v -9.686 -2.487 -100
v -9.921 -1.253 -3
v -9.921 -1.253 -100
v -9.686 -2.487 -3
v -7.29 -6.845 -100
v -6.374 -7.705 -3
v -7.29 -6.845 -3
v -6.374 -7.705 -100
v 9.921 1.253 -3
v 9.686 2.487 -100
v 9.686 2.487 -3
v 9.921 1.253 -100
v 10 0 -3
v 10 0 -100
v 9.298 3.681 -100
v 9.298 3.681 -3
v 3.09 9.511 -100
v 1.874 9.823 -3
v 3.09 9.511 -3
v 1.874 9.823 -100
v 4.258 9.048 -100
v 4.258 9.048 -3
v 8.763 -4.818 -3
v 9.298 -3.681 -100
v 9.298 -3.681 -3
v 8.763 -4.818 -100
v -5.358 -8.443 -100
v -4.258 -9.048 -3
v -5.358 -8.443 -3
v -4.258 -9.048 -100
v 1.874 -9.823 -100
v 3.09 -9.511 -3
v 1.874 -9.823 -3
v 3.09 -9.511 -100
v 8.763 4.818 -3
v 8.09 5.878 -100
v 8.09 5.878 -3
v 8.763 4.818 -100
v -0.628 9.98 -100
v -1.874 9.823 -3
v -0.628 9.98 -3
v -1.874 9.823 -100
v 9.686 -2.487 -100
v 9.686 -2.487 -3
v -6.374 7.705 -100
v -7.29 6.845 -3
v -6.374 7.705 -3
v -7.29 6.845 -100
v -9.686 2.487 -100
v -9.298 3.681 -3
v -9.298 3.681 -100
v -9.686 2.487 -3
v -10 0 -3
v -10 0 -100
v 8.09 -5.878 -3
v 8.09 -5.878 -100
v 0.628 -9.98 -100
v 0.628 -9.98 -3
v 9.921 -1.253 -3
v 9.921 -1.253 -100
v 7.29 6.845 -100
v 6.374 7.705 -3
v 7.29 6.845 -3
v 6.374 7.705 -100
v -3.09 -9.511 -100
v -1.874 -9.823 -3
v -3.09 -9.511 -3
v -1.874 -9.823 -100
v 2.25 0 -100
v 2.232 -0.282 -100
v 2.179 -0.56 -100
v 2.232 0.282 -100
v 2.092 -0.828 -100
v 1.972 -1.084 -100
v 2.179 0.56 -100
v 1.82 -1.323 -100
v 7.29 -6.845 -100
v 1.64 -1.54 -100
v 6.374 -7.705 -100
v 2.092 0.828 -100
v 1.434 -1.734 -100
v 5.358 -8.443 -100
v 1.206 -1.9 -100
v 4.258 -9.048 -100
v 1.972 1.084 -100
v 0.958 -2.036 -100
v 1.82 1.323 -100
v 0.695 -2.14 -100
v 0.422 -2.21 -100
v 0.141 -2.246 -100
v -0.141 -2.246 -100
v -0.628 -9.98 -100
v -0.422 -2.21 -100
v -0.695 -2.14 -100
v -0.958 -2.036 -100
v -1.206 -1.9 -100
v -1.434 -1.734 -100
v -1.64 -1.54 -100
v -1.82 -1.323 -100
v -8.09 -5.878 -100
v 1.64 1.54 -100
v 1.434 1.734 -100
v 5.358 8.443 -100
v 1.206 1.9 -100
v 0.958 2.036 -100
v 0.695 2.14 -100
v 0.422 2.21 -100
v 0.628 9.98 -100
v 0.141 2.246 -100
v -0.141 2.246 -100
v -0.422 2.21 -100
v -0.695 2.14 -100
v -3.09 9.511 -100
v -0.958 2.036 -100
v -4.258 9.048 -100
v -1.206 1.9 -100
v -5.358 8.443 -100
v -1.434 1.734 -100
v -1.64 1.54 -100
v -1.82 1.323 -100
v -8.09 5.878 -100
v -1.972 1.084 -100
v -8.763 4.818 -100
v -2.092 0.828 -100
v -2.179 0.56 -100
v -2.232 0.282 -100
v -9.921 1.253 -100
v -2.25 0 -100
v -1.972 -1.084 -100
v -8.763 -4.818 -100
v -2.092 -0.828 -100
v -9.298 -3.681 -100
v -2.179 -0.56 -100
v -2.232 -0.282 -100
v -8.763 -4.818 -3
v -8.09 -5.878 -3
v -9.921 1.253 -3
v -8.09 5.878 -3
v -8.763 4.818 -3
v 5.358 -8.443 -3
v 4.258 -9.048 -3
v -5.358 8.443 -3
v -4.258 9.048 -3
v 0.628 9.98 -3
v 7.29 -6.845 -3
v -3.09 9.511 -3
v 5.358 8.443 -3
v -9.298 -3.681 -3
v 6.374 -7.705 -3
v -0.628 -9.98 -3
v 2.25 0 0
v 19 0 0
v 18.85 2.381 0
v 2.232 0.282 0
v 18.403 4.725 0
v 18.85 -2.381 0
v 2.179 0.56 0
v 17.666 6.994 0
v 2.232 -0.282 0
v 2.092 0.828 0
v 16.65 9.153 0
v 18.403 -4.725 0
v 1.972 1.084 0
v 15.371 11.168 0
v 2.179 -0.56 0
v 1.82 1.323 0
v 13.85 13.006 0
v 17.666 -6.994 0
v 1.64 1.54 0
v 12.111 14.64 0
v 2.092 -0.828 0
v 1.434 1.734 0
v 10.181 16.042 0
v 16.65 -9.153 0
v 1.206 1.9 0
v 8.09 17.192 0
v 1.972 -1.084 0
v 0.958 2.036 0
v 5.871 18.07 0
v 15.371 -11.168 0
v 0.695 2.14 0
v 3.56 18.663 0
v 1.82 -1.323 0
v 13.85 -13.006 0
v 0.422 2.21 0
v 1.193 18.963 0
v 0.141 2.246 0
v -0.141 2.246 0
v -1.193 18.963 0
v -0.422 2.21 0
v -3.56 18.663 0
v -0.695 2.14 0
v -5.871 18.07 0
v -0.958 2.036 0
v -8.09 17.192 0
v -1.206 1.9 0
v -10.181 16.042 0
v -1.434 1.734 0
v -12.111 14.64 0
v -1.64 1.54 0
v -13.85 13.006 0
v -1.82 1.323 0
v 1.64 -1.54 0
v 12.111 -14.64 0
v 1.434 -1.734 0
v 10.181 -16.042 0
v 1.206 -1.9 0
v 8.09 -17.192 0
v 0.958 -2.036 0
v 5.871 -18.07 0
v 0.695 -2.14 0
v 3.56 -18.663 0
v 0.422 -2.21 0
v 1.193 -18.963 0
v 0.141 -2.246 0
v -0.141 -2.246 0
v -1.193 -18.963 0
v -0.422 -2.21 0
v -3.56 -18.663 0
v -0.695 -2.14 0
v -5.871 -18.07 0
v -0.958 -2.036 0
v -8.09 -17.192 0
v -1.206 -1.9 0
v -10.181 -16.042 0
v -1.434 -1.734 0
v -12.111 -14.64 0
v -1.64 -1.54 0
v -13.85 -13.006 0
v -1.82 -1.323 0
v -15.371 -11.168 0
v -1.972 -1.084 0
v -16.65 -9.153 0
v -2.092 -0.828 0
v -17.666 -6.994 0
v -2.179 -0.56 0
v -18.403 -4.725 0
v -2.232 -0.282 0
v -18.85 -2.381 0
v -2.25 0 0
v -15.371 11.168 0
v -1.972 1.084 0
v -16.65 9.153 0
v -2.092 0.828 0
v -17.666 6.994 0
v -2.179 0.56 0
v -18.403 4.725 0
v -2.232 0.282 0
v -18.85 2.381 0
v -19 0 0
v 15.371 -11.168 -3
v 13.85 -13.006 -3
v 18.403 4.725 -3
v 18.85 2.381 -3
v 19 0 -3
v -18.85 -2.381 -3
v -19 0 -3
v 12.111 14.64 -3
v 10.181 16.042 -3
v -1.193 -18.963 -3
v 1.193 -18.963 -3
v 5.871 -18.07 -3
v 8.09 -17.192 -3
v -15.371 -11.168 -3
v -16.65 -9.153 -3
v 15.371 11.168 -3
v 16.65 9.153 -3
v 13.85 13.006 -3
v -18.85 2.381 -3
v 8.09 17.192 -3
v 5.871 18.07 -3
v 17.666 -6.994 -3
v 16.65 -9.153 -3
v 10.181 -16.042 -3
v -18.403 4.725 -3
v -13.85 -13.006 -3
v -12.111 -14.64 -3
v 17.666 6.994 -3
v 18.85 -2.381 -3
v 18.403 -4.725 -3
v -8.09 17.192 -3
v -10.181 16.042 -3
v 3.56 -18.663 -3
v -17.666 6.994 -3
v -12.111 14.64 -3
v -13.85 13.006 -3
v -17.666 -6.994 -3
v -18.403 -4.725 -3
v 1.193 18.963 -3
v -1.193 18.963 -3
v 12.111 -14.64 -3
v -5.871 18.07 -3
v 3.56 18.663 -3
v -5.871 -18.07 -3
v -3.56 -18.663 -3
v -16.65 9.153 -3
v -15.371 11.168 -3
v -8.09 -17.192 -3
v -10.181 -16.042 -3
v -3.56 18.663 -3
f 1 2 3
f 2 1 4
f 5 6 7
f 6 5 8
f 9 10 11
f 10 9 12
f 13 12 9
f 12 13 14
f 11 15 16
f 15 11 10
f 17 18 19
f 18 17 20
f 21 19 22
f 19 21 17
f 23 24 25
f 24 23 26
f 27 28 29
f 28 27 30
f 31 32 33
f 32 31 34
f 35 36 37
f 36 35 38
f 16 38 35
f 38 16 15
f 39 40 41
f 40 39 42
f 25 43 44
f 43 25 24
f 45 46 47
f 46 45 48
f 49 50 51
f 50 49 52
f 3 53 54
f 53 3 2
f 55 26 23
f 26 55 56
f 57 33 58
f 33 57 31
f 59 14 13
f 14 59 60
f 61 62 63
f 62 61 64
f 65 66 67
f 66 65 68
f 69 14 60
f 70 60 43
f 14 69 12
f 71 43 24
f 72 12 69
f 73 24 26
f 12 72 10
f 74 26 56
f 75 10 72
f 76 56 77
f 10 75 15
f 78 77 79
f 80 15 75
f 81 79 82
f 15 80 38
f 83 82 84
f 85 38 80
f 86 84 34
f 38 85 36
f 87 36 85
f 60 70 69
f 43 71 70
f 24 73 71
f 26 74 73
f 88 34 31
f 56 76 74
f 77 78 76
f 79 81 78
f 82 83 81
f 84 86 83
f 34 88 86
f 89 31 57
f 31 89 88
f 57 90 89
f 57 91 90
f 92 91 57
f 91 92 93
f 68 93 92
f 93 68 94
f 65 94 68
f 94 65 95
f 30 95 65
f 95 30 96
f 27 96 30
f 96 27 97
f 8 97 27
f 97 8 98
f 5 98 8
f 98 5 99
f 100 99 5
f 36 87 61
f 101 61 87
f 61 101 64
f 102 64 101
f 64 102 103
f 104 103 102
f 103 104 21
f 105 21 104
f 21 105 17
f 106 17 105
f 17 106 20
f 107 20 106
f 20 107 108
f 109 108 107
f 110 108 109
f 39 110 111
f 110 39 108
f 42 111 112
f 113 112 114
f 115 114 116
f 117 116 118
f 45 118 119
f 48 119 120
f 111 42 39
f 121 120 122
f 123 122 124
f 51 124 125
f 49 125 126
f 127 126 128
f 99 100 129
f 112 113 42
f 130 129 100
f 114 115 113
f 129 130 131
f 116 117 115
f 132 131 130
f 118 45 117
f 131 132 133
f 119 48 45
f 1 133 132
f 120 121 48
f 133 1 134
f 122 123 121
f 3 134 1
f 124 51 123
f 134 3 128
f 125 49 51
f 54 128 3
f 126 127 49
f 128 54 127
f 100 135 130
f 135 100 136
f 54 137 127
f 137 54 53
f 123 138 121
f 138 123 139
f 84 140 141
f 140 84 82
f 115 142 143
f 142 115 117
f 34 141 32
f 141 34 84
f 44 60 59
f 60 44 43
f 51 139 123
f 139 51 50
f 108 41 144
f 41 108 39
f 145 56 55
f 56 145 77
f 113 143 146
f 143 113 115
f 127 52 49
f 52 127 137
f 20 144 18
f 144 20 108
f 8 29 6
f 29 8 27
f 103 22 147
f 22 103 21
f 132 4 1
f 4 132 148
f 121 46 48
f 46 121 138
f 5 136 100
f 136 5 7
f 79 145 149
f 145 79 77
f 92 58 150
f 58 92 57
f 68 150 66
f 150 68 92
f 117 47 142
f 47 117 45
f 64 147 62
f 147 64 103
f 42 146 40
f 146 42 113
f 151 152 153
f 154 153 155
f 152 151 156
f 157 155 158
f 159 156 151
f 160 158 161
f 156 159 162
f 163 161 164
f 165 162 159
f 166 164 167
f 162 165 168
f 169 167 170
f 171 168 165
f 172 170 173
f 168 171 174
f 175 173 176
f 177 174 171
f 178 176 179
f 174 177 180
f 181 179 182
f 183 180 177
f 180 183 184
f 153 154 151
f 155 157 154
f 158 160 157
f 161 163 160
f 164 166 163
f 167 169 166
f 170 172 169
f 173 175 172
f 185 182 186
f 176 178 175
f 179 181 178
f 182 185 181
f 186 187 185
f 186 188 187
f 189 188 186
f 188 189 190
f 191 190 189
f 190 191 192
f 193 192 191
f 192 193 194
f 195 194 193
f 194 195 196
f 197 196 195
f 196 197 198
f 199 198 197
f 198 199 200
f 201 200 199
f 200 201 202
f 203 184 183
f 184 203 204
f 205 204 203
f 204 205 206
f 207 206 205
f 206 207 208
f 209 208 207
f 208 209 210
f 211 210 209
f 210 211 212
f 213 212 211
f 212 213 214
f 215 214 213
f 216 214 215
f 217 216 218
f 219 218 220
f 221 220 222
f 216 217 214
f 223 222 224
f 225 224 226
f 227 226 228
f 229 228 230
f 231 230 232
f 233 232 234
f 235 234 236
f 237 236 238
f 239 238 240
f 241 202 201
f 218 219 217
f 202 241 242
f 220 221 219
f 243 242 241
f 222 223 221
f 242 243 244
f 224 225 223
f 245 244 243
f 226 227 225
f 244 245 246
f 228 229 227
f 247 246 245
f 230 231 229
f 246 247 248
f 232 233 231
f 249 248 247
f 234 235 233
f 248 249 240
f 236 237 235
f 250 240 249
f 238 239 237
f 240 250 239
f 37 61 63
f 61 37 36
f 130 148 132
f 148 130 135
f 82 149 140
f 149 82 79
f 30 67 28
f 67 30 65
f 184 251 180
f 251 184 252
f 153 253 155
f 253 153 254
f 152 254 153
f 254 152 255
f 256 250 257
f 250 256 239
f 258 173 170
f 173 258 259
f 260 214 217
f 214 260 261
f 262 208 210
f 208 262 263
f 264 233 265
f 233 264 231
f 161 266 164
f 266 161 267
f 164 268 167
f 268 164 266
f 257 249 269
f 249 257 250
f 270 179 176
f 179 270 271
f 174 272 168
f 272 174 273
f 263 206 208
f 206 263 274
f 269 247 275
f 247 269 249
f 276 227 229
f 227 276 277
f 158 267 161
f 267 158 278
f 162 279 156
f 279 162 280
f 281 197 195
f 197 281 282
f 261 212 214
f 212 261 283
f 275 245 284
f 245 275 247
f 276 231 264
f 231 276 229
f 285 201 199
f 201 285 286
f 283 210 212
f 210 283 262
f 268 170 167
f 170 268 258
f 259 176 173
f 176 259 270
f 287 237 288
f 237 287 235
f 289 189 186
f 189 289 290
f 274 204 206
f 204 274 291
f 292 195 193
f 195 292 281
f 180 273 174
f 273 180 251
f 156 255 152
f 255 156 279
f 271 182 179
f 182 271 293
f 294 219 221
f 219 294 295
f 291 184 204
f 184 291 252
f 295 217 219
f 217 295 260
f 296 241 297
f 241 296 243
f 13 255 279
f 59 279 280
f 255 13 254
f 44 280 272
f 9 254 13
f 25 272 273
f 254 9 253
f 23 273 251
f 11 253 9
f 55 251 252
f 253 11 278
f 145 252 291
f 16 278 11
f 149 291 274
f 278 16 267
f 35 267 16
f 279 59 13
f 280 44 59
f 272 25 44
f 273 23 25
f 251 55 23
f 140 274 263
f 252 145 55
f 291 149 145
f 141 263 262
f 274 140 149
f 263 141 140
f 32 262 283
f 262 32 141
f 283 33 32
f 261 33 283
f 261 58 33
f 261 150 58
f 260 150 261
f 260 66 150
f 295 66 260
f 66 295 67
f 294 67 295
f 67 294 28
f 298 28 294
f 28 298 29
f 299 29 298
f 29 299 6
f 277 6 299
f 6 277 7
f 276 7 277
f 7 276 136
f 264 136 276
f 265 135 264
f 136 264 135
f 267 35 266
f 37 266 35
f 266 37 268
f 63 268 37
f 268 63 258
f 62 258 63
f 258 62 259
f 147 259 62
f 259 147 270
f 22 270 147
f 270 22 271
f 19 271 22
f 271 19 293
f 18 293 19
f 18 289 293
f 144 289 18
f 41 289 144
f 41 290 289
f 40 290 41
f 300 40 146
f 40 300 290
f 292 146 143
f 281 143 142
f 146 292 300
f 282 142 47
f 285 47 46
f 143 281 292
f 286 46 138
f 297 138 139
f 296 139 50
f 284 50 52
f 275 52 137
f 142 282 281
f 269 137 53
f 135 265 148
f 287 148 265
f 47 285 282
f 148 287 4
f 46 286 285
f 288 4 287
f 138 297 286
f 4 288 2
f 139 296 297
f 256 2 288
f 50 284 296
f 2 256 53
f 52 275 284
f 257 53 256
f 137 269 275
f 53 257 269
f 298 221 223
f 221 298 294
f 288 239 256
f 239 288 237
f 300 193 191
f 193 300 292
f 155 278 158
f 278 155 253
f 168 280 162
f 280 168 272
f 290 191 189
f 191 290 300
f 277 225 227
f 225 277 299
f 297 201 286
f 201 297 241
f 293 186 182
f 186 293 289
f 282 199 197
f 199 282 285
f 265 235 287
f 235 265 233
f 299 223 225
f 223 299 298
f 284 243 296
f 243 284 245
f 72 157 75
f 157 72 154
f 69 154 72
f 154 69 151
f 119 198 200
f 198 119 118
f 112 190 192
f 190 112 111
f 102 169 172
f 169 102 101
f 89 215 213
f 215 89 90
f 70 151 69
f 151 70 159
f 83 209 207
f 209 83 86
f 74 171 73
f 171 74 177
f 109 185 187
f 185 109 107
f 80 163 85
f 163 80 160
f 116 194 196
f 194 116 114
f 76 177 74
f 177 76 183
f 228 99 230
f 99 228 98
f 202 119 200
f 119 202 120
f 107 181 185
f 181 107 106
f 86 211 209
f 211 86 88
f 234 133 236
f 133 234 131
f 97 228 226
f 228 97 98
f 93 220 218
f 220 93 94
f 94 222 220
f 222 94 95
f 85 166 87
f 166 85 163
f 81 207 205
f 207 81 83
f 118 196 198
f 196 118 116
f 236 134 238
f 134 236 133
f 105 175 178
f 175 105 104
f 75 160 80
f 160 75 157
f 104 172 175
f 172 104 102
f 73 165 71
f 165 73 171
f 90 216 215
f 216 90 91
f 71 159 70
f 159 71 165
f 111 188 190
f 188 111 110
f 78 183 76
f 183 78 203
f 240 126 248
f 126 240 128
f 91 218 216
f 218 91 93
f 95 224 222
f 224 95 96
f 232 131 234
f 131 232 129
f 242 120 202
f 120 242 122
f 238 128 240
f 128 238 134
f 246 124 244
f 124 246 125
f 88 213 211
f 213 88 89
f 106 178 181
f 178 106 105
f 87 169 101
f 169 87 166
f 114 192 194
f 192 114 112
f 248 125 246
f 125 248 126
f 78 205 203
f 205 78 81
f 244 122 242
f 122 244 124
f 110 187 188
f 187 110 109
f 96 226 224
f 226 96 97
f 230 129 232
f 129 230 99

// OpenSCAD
$fn = 50;


difference() {
	union() {
		translate(v = [0, 0, -100.0000000000]) {
			cylinder(h = 100, r = 10.0000000000);
		}
		translate(v = [0, 0, -3.0000000000]) {
			cylinder(h = 3, r = 19.0000000000);
		}
	}
	union() {
		#translate(v = [0, 0, -100]) {
			cylinder(h = 100, r = 2.2500000000);
		}
	}
}
